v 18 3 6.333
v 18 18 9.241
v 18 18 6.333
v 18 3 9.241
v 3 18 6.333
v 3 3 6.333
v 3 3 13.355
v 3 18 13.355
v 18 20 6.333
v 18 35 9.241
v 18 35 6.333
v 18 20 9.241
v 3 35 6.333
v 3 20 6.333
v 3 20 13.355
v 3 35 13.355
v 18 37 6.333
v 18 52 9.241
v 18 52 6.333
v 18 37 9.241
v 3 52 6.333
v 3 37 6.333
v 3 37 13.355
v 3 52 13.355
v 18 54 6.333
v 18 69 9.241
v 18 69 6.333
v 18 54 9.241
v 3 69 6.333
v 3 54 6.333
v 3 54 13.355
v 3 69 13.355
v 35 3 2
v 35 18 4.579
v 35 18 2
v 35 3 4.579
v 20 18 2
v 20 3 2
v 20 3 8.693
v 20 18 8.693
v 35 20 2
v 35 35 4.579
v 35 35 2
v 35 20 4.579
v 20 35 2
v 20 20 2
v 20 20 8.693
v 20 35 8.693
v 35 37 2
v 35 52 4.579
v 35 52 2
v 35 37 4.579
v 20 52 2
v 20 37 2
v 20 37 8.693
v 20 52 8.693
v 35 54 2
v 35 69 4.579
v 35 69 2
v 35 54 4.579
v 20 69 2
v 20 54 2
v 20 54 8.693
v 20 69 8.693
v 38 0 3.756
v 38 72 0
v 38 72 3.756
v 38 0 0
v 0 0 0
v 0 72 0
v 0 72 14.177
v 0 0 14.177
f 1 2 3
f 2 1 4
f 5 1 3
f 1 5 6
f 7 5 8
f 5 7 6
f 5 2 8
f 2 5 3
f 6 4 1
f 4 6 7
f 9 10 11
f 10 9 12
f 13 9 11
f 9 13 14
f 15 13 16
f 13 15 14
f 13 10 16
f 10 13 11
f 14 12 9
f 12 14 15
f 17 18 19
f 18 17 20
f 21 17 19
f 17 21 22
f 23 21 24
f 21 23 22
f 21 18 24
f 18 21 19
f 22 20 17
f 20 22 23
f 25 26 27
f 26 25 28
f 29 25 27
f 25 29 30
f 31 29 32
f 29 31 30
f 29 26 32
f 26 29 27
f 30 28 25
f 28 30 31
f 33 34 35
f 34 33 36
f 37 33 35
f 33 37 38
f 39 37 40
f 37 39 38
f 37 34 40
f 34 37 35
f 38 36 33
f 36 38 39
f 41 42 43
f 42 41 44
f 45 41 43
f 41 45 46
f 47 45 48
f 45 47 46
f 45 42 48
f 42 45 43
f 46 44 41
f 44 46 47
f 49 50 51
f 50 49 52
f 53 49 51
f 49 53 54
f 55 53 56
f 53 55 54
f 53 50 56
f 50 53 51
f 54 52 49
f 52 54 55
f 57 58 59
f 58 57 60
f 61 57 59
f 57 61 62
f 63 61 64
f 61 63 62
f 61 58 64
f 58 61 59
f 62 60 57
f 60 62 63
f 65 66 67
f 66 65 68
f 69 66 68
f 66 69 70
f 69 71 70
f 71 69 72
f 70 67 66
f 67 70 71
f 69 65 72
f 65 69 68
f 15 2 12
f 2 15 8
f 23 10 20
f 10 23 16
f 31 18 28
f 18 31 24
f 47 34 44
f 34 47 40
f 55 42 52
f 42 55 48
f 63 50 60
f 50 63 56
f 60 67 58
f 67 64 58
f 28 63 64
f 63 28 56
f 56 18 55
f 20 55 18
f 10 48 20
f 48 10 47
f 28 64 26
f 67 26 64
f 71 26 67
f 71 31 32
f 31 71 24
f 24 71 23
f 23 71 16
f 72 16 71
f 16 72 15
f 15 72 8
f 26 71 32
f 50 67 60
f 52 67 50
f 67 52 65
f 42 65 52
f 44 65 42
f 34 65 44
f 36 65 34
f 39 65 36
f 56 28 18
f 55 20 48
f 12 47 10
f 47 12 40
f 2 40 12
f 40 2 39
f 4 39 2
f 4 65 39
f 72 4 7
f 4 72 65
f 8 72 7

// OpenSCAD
/**
 * Customizable SMD tray boxes
 * http://www.thingiverse.com/thing:1816077
 *
 * Original by GoolGaul (http://www.thingiverse.com/GoolGaul/about)
 * Original Thing: http://www.thingiverse.com/thing:56731
 *
 * Author: Dennis Schmitt <peppie23@gmail.com>
 */

// Max height if the rear trays in mm
max_height = 15;

// Set the max columns and rows
rows = 2;
cols = 4;

// Set the dimension of one tray in mm
tray_dim_x = 15;
tray_dim_y = 15;

// Set the space between each tray in mm
// A value lower or eq 0 will be set to 1mm
tray_space = 2;

// Set the thickness of the edge in mm
// A value lower or eq 0 will be set to 1mm
edge_thickness = 3;

// Set the bottom thickness in mm
// A value lower or eq 0 will be set to 1mm
box_bottom_thickness = 2;

// Enable or disable the flattening of the tray
// Values are true or false
box_flattening = true;

// Enable or disable stair stepping vor the bottom of the tray.
// Is this option is enabled the bottom of the rear trays will be higher
tray_stair_stepping = true;

/////////////////////////////////////////////////////////////////////////////
/////////////////////////////////////////////////////////////////////////////

difference()
{
    // check the minimum parameters for box_bottom_thickness,edge_thickness and tray_space
    box_bottom_thickness = (box_bottom_thickness<=0) ? 1:box_bottom_thickness;
    edge_thickness = (edge_thickness<=0) ? 1:edge_thickness;
    tray_space = (tray_space<=0) ? 1:tray_space;
    
    // some helper variables
    tray_spacer_x = (tray_dim_x+tray_space);
    tray_spacer_y = (tray_dim_y+tray_space);
    times2edge = 2*edge_thickness;
    box_dim_x = (rows*tray_spacer_x)-tray_space+times2edge;
    box_dim_y = (cols*tray_spacer_y)-tray_space+times2edge;
    stair_step_height = ((max_height-box_bottom_thickness)/(rows*1.5));
    
    // make base of tray
    cube([box_dim_x,box_dim_y,max_height]);

    // loop column and row trays
    for(row=[0:rows-1]){
        for (col=[0:cols-1]){
            stair_height = (tray_stair_stepping) ? ((rows-1)-row)*stair_step_height:0;
            translate([ edge_thickness+(row*tray_spacer_x),edge_thickness+(col*tray_spacer_y),box_bottom_thickness+stair_height])
            cube([ tray_dim_x, tray_dim_y, max_height]); 
        }
    }
    
    if(box_flattening){
        // rotate the cutter by asin
        arcsin = asin((max_height-(max_height*0.33))/box_dim_x);
        // place the cutter cube
        translate([-edge_thickness,-edge_thickness,max_height])
        rotate([0,arcsin,0])
        cube([(box_dim_x*2)+times2edge,box_dim_y+times2edge,max_height]);
    }
}
